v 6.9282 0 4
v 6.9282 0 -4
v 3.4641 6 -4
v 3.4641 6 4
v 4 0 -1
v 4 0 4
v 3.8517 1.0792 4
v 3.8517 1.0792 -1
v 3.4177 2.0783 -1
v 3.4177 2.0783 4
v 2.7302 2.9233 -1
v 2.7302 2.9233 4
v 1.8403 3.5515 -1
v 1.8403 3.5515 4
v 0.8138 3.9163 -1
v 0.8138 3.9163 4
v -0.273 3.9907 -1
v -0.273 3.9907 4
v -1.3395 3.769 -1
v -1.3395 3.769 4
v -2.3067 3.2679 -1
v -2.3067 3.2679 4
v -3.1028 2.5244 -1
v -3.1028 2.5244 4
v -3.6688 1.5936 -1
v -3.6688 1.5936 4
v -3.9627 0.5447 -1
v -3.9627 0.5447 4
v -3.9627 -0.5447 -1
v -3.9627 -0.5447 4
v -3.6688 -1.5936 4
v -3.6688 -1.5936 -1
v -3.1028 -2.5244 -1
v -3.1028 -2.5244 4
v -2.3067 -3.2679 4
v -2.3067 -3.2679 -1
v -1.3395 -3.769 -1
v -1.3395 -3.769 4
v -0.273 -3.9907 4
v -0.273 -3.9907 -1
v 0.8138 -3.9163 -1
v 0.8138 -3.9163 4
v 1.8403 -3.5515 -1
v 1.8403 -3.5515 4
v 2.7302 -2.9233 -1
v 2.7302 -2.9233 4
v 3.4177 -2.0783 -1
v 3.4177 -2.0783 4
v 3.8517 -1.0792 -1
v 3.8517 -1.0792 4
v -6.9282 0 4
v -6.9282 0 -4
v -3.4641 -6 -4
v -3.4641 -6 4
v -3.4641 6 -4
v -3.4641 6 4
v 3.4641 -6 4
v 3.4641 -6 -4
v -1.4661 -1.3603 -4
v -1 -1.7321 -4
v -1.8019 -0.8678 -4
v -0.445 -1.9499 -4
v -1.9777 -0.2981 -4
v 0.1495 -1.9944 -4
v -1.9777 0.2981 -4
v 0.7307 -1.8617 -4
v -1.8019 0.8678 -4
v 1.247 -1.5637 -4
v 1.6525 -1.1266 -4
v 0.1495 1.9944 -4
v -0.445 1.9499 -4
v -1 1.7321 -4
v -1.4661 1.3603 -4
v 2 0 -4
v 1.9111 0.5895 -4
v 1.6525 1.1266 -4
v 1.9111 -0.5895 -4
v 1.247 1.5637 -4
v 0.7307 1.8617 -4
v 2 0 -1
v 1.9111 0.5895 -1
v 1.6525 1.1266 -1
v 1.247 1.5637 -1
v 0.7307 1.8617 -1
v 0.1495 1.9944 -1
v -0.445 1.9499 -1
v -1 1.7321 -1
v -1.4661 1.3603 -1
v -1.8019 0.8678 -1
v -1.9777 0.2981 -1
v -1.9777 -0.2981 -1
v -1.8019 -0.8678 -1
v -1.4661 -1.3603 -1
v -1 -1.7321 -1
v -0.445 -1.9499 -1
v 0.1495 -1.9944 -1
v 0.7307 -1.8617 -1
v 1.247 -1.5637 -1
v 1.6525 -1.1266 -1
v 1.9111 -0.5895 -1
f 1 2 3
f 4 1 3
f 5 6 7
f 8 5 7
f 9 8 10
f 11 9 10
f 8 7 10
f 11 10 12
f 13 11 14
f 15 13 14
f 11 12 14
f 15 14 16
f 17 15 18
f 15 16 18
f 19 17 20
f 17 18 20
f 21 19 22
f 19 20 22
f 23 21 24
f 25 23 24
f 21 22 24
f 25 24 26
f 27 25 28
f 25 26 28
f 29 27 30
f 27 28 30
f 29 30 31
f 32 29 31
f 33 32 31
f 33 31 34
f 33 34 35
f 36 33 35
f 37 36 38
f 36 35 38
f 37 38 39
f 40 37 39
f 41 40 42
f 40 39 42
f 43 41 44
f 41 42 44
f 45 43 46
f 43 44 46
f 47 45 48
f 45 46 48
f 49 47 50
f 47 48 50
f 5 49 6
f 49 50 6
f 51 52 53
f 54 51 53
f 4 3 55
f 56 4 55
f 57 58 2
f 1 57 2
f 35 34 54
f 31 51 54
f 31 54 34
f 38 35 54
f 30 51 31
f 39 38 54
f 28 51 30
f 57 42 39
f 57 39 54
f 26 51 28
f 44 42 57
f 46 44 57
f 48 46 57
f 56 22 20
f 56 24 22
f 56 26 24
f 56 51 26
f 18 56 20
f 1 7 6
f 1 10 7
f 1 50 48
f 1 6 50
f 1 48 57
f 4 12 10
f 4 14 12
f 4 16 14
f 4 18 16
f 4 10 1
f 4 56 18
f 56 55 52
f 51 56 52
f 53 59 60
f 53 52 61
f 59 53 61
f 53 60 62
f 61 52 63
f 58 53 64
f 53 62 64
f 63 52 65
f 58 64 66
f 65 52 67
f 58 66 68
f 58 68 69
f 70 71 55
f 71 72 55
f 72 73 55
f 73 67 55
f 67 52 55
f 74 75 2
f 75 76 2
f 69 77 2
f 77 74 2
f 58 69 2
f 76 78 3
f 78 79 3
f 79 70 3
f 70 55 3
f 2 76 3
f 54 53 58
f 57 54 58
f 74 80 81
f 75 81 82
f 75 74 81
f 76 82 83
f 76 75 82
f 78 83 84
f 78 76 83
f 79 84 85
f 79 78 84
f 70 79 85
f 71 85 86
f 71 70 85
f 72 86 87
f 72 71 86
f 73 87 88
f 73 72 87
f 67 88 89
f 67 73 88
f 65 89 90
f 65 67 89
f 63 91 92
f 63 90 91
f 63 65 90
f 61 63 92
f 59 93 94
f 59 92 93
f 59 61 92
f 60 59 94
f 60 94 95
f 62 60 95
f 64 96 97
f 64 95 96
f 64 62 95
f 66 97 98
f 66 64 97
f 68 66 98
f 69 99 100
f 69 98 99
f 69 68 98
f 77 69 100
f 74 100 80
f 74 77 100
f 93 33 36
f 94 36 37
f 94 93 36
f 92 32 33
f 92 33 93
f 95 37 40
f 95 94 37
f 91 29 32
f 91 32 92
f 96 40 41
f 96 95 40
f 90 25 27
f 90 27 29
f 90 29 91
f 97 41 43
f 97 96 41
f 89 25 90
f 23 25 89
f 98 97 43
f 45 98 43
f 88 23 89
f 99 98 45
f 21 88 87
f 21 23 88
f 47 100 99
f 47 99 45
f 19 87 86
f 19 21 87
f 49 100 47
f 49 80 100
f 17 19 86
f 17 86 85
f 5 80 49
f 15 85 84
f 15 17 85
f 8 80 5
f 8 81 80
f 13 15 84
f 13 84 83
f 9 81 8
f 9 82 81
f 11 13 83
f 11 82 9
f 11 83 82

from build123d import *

# Parameters (mm, degrees)
SKETCH1_R           = 2
BOSS_EXTRUDE1_DEPTH = 4
SKETCH2_R           = 4
CUT_EXTRUDE1_DEPTH  = 5


with BuildPart() as part:
    # Sketch1 → Boss-Extrude1 (new, symmetric)
    with BuildSketch(Plane.XY):
        Polygon((6.92820323, 0), (3.464101615, 6), (-3.464101615, 6), (-6.92820323, 0), (-3.464101615, -6), (3.464101615, -6), align=None)
        Circle(SKETCH1_R, mode=Mode.SUBTRACT)
    extrude(amount=BOSS_EXTRUDE1_DEPTH, both=True)

    # Sketch2 → Cut-Extrude1 (cut)
    with BuildSketch(Plane.XY.offset(4)):
        Circle(SKETCH2_R)
    extrude(amount=-CUT_EXTRUDE1_DEPTH, mode=Mode.SUBTRACT)


solid = part.part
